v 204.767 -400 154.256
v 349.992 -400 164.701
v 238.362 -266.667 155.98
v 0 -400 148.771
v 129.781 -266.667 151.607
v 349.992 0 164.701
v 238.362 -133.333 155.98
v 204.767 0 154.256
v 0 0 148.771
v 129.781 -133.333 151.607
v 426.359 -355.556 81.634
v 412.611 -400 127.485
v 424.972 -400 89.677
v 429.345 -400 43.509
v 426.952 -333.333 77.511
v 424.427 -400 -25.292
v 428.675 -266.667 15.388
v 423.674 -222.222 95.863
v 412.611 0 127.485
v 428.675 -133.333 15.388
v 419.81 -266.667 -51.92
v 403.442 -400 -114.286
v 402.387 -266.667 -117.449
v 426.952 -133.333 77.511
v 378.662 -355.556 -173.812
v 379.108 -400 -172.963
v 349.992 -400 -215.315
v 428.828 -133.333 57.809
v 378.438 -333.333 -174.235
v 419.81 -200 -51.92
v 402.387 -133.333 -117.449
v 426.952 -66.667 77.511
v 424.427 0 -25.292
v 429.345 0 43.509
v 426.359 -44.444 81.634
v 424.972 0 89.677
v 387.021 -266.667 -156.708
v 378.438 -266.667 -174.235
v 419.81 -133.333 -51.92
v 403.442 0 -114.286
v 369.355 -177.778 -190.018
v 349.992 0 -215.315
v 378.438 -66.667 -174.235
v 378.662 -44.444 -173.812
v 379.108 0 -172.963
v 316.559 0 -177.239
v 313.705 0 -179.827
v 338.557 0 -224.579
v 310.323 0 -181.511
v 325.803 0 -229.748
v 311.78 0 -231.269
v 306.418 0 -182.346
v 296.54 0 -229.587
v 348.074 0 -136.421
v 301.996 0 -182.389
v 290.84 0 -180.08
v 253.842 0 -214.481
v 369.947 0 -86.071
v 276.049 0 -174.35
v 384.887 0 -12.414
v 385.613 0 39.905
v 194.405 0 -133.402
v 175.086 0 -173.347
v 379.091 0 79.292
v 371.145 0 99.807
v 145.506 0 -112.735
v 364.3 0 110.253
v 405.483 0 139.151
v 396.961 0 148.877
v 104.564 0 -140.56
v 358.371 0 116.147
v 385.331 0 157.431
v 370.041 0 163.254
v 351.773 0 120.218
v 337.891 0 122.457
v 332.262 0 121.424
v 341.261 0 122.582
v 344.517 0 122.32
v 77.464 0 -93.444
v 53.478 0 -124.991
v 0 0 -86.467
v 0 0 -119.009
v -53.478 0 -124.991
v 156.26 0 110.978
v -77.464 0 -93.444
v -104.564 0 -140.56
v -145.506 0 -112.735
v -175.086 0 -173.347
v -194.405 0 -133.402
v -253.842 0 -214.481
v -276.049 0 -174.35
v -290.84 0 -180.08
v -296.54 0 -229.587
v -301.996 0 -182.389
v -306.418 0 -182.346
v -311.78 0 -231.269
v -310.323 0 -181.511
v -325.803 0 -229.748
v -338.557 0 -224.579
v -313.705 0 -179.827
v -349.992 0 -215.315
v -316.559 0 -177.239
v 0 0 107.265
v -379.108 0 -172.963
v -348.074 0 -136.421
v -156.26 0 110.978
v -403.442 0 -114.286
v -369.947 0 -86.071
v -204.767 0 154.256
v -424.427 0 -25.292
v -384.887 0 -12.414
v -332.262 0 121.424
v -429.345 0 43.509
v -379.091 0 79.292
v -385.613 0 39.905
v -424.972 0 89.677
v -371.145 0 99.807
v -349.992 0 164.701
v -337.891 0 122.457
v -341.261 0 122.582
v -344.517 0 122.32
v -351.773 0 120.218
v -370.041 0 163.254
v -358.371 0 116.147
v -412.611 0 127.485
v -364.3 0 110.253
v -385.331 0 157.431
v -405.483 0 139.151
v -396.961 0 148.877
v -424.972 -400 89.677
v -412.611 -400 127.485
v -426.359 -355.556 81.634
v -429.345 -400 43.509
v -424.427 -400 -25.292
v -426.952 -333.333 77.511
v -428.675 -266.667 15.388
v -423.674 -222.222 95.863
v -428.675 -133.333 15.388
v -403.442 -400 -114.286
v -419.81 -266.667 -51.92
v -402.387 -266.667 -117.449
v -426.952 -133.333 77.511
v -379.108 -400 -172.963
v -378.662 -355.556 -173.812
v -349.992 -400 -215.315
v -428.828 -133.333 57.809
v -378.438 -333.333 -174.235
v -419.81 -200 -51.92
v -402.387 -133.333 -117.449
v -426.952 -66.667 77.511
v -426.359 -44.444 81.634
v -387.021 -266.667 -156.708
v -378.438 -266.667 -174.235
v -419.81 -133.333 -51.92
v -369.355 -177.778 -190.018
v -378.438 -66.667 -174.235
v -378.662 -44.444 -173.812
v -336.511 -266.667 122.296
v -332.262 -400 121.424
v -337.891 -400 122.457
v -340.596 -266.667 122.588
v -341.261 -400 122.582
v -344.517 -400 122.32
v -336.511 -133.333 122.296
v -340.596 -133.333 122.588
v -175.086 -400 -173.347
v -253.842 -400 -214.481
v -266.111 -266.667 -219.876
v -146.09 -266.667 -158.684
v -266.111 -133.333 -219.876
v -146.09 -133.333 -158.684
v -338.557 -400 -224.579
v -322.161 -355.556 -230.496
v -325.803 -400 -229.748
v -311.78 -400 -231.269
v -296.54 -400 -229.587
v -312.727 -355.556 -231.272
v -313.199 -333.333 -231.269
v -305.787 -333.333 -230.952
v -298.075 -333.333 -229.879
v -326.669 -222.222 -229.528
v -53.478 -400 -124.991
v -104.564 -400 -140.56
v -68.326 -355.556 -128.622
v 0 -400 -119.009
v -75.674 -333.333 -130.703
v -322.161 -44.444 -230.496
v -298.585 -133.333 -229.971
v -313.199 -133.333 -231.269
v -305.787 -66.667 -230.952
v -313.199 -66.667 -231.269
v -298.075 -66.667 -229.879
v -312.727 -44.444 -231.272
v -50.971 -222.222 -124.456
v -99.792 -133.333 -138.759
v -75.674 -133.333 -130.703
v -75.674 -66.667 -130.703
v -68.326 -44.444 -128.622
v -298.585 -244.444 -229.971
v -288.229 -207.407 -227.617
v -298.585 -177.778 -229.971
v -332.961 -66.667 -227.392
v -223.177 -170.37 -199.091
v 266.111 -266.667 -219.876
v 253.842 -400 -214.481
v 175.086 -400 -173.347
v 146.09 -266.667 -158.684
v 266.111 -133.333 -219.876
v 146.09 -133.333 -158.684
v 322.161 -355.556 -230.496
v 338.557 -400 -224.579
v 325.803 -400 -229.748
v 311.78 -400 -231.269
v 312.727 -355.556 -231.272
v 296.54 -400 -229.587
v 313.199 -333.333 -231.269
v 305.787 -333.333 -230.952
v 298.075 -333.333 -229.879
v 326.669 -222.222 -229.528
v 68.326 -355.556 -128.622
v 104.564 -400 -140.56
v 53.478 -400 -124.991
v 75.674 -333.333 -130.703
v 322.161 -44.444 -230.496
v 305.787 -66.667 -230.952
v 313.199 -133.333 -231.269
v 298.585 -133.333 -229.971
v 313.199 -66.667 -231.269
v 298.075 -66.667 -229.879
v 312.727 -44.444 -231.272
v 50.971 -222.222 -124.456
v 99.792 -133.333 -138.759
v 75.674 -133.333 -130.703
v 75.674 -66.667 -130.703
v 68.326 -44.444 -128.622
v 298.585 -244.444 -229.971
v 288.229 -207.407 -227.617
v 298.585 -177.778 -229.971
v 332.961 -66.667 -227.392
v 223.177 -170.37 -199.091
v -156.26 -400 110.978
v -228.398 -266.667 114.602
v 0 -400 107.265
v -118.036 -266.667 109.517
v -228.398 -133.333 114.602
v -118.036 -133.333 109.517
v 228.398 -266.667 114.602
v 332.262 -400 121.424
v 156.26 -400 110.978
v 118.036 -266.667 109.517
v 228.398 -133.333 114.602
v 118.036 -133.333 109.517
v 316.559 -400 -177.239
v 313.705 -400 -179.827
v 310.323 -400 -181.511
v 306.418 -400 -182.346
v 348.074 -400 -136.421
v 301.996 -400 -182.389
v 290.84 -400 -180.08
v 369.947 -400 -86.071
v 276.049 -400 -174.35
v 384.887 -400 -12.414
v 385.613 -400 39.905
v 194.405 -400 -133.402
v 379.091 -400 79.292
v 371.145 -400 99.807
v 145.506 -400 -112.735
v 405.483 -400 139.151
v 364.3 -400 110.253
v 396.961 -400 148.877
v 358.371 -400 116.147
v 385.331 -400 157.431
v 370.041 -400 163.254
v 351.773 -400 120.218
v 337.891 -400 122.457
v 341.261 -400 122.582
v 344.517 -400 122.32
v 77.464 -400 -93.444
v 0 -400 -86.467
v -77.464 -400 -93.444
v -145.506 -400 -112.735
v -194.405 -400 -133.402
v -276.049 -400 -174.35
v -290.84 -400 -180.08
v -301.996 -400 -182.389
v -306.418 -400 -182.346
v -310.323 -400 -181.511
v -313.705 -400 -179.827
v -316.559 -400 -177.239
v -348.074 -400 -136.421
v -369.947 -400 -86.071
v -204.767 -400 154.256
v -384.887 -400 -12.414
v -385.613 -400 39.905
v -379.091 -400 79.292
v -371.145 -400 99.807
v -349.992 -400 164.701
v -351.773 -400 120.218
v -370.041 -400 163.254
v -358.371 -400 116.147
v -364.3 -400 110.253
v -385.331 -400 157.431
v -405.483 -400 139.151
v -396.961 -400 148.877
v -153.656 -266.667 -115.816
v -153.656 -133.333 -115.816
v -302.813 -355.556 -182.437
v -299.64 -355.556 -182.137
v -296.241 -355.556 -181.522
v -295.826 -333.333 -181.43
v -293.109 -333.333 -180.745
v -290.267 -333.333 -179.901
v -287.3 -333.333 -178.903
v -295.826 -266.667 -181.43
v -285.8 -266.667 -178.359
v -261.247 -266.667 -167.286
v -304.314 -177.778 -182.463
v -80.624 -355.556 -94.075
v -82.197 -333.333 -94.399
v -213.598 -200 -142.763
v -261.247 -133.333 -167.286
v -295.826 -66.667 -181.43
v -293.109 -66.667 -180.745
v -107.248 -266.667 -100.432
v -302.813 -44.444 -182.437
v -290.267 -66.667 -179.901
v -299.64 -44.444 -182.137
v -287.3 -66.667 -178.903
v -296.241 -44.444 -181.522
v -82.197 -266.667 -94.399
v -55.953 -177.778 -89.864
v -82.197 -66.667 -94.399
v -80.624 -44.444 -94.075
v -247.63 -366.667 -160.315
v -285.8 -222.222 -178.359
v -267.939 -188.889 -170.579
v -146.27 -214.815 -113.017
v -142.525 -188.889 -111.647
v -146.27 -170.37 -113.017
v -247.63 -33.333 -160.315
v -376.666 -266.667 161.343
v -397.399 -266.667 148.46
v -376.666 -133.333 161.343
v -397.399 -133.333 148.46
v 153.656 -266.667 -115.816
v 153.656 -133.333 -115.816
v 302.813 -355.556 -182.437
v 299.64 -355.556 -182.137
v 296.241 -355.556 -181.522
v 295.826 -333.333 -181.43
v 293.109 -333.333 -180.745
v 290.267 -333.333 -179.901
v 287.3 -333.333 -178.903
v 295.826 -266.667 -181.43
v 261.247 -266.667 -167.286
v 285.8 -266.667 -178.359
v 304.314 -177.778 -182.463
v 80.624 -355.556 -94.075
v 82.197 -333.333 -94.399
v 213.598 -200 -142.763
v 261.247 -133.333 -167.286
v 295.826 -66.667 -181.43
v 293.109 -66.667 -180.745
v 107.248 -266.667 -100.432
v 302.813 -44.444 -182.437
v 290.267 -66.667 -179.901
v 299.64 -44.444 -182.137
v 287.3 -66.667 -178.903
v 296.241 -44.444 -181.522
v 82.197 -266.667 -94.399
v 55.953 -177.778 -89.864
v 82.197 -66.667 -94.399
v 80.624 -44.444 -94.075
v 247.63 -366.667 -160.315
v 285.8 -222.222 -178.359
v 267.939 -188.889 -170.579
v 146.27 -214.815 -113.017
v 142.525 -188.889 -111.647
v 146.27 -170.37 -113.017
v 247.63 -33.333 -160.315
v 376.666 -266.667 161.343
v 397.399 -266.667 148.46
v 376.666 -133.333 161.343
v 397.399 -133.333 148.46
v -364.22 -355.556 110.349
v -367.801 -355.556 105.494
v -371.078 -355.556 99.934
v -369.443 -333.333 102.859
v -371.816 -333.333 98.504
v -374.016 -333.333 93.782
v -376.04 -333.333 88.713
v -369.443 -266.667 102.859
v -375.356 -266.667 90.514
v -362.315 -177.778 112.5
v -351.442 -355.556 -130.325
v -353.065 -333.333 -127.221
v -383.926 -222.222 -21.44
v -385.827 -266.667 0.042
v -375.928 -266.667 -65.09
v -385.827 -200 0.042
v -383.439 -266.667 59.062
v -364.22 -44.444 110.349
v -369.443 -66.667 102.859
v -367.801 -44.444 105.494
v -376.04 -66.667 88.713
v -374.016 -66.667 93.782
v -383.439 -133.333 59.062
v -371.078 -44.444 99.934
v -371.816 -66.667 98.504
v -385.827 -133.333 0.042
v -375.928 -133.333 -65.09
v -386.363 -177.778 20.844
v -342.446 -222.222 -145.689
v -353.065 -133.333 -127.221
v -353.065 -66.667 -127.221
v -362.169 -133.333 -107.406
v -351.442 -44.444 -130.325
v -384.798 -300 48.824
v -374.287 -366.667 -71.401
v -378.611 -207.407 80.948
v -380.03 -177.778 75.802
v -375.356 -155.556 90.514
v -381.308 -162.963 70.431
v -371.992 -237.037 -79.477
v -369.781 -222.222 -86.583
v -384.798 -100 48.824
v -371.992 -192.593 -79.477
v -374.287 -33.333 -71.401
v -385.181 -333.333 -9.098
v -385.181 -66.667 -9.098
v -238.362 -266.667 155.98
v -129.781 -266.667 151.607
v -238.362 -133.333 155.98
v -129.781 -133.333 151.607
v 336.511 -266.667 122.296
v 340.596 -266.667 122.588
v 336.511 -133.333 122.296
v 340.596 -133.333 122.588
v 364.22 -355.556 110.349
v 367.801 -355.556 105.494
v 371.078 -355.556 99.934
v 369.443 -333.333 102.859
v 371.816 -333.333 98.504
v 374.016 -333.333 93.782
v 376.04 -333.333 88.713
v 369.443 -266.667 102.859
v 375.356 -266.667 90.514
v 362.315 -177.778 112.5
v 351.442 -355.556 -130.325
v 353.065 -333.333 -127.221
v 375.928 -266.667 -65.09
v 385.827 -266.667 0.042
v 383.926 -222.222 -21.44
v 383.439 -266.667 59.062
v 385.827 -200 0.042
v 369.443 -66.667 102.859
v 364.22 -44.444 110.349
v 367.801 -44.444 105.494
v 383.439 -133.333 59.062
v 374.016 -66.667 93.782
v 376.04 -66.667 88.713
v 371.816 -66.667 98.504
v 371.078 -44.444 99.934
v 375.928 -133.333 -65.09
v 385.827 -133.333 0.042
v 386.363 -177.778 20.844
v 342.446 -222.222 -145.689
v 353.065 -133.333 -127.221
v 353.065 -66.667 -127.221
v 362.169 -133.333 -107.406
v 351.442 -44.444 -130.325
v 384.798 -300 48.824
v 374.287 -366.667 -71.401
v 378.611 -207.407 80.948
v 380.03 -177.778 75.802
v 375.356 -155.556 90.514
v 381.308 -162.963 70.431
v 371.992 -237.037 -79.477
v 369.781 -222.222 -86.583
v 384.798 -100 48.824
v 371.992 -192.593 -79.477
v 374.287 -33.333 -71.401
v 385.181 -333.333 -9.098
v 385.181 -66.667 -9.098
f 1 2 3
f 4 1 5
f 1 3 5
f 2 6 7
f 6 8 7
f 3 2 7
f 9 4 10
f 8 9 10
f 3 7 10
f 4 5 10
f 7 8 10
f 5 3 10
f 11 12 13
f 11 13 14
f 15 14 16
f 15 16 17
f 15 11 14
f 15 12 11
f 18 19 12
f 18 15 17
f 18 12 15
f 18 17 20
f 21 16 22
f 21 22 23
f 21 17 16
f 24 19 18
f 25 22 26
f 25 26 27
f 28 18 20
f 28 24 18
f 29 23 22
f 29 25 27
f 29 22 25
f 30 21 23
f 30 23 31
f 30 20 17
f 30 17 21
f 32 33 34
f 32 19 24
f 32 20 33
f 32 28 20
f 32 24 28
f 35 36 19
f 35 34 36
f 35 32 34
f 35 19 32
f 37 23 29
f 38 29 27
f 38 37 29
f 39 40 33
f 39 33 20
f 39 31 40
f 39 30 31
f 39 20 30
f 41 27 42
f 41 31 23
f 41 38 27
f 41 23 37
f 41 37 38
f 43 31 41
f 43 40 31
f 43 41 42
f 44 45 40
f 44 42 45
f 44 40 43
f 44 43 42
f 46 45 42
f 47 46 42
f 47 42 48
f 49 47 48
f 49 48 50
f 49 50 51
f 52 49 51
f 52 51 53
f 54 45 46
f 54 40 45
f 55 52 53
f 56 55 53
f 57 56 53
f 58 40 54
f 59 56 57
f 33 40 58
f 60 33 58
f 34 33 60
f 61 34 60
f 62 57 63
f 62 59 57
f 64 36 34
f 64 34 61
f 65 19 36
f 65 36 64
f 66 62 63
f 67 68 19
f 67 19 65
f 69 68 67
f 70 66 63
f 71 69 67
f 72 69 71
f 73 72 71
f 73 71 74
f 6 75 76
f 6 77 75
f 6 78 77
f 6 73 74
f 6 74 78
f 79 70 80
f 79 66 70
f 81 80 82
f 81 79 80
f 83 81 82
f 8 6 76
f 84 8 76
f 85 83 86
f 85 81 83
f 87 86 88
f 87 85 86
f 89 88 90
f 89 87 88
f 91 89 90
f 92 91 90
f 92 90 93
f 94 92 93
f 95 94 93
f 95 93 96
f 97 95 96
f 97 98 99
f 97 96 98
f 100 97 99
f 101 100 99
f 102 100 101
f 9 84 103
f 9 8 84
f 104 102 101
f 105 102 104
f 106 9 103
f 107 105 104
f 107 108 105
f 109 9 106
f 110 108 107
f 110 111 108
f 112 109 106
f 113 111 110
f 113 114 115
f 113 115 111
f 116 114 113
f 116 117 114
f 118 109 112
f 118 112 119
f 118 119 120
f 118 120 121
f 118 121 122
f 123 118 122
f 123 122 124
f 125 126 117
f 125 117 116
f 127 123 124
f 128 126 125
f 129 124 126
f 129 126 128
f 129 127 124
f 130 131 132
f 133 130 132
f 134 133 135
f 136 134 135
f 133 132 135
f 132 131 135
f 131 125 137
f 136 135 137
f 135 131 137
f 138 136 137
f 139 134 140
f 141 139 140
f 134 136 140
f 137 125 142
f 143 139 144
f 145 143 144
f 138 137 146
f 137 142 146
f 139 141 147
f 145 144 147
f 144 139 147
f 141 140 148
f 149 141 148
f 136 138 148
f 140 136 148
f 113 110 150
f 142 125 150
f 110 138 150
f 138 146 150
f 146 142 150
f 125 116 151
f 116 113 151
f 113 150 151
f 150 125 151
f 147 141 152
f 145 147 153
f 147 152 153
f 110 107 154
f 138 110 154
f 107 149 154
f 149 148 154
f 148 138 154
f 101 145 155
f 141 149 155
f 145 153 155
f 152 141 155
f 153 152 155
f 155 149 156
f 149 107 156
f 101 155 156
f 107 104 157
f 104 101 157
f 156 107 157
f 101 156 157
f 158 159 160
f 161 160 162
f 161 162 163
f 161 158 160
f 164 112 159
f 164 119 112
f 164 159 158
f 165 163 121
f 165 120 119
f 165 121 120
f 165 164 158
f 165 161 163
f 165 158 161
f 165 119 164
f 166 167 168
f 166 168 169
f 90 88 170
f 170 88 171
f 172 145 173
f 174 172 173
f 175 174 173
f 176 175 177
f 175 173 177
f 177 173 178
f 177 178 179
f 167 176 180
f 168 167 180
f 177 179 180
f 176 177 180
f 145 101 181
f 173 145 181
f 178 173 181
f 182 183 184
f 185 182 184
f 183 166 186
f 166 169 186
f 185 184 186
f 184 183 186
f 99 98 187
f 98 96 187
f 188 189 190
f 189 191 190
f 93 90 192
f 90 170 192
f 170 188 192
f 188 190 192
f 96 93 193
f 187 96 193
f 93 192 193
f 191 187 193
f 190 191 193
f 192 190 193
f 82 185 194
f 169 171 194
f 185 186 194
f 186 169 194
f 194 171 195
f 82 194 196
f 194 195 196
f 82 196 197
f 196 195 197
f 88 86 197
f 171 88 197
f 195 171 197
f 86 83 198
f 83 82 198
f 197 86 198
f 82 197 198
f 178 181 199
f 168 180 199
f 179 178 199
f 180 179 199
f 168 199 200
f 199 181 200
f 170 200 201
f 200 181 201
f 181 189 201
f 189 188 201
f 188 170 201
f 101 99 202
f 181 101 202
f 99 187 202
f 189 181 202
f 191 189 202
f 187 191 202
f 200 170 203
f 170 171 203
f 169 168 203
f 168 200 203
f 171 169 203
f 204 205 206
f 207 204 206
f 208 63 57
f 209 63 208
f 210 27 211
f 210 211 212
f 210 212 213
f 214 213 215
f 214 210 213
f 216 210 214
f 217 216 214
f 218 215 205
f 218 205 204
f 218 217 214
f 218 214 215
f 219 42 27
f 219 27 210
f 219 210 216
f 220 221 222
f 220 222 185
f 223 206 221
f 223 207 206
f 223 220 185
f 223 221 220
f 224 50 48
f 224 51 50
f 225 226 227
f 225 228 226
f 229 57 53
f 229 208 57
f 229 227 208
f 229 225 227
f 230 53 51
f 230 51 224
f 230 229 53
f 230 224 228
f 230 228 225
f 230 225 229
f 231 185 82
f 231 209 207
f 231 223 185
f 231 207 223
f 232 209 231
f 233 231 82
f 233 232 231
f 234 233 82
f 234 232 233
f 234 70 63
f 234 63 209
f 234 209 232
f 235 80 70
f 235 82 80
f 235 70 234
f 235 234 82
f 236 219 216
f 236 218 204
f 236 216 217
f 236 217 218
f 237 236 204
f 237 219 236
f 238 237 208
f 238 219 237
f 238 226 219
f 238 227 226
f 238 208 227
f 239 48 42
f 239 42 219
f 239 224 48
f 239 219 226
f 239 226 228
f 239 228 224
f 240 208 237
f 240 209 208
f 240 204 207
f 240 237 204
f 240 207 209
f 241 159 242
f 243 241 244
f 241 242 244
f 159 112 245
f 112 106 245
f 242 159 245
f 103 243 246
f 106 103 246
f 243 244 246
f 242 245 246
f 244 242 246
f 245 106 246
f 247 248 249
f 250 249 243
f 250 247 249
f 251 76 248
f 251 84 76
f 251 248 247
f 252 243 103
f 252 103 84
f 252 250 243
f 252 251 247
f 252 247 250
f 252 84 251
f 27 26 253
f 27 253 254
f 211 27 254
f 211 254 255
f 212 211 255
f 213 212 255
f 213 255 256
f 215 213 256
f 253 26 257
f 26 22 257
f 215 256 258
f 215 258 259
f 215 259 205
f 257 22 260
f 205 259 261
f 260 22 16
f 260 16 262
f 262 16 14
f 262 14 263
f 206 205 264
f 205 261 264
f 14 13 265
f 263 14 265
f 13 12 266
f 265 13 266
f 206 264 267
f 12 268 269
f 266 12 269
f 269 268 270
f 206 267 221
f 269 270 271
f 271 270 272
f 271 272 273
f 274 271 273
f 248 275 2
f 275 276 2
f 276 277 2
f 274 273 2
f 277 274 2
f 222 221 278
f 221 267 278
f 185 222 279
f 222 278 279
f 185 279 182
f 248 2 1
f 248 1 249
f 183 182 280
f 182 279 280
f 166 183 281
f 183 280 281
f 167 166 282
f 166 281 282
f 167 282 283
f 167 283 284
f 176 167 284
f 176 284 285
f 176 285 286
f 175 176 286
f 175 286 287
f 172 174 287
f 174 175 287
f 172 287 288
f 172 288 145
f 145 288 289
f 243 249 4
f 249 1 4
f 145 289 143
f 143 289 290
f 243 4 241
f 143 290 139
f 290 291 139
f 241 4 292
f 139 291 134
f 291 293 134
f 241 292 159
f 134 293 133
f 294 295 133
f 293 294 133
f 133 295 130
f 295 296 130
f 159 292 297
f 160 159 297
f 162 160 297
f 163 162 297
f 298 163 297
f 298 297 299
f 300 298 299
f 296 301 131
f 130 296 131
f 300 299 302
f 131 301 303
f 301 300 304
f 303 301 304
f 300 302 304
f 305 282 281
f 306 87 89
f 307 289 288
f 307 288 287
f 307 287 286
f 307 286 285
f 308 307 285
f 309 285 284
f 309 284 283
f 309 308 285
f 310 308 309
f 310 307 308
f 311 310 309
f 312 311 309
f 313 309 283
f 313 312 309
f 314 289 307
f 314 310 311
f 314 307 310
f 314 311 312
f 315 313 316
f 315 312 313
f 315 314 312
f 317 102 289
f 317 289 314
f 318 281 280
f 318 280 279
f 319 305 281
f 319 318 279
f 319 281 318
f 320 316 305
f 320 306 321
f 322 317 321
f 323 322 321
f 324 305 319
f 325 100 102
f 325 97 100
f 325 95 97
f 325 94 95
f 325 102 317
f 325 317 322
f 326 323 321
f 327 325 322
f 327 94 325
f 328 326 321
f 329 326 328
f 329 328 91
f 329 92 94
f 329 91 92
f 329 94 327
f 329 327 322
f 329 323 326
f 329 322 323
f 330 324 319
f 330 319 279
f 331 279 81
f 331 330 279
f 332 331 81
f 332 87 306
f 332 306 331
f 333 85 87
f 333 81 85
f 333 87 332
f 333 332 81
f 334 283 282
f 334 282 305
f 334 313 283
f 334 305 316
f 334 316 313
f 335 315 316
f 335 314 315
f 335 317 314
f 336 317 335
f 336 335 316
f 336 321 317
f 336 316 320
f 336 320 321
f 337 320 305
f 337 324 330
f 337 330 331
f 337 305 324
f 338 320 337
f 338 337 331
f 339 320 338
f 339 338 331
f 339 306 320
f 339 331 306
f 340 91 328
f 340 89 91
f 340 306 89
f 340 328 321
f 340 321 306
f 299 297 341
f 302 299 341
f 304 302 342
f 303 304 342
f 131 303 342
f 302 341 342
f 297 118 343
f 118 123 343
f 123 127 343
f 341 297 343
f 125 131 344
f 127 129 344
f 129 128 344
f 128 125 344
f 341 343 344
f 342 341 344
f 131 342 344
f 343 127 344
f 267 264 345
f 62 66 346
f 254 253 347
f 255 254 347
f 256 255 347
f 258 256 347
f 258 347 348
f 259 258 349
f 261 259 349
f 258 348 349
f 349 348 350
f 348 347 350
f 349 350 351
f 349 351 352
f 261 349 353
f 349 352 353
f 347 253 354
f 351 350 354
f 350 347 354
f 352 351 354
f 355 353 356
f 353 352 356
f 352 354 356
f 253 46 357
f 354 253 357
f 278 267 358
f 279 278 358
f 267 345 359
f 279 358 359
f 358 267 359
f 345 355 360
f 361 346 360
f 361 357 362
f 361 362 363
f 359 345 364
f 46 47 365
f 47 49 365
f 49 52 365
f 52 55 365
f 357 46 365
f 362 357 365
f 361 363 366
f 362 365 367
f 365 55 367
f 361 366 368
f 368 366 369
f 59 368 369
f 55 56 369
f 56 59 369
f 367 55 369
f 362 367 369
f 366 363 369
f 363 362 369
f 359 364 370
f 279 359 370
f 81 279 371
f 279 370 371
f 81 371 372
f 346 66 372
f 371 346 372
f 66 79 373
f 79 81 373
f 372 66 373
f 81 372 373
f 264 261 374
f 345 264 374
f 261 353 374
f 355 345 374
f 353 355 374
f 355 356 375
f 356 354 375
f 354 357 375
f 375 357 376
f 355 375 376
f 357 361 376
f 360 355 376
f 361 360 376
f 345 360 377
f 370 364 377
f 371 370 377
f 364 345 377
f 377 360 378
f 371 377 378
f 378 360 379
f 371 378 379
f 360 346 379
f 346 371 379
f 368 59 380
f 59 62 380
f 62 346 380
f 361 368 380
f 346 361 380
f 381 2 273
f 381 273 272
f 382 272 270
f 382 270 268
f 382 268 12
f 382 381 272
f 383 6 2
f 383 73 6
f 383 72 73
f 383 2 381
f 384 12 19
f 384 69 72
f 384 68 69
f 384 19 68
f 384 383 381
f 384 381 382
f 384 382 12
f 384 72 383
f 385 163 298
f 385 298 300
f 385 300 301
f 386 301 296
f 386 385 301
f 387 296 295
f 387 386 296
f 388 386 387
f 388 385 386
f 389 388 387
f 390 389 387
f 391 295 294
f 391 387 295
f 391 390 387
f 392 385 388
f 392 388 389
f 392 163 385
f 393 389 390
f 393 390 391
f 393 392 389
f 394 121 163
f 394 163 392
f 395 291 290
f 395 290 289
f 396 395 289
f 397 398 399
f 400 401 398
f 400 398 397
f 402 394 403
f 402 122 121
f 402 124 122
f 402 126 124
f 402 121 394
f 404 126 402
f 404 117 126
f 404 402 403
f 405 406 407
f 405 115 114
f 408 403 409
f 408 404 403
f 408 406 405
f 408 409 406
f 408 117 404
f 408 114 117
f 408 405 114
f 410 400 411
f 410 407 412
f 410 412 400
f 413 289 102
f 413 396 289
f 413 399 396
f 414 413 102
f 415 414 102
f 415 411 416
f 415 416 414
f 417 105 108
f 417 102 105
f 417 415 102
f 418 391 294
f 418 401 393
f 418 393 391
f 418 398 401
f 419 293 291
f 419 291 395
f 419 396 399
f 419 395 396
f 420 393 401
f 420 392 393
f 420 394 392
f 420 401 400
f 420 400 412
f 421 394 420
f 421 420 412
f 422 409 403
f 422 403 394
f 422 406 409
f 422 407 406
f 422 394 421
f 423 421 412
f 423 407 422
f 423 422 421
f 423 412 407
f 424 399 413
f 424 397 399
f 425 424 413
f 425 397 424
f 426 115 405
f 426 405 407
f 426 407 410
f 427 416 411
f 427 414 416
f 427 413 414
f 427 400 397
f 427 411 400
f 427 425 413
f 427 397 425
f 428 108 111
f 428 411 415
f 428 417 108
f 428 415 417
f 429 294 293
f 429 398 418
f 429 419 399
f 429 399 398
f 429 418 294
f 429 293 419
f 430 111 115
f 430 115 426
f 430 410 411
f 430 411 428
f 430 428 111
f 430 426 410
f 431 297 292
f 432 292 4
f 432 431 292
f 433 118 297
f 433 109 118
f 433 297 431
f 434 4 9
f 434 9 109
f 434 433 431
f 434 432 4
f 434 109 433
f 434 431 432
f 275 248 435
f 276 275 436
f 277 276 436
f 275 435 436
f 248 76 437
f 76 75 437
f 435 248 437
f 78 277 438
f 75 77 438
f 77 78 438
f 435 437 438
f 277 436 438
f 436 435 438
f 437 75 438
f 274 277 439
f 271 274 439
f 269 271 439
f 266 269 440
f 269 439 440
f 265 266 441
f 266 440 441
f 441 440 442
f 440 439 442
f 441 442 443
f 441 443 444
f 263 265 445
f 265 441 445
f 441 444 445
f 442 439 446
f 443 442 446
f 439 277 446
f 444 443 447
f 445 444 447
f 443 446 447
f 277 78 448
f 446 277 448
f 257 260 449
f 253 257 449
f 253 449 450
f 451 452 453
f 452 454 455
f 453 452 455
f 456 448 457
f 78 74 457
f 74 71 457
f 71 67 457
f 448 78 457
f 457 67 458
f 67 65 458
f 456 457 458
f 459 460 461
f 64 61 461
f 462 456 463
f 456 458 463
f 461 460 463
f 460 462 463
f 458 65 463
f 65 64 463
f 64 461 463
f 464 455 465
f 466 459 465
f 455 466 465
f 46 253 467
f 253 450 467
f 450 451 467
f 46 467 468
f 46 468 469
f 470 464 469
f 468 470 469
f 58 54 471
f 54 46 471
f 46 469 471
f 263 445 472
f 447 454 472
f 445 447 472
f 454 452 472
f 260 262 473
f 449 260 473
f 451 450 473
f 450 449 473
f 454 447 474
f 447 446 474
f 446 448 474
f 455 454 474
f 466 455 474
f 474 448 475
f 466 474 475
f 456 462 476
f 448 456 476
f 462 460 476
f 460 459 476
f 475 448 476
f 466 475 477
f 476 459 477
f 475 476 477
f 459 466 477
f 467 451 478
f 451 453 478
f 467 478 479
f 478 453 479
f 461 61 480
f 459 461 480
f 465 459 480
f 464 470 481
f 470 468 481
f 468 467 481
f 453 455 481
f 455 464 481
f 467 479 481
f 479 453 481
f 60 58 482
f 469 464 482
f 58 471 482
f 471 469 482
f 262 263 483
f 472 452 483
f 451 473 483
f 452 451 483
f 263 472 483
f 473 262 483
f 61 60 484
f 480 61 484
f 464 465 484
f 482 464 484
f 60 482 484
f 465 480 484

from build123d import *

# Parameters (mm, degrees)
F1_DEPTH = 400


with BuildPart() as f1:
    # F0 (on Front) → F1 (new body)
    with BuildSketch(Plane.XZ):
        with BuildLine():
            add(Edge.make_bspline(
                [(-349.9918261405, 164.7005370527), (-228.7541310859, 152.8680934101), (-148.4648335347, 151.7757154689), (0, 148.7712413073)],
                knots=[17.2755734709, 17.2755734709, 17.2755734709, 17.2755734709, 368.6136798781, 368.6136798781, 368.6136798781, 368.6136798781], degree=3))
            add(Edge.make_bspline(
                [(-349.9918261405, 164.7005370527), (-379.7747257767, 166.5833651071), (-400.0212253579, 152.0293008743), (-412.6107976831, 127.4847845064)],
                knots=[0, 0, 0, 0, 86.6035481416, 86.6035481416, 86.6035481416, 86.6035481416], degree=3))
            add(Edge.make_bspline(
                [(-412.6107976774, 127.4847845008), (-390.2805647898, 125.7630890537), (-367.6040024639, 124.021633923), (-344.5166107631, 122.3204635533)],
                knots=[55.3884070152, 55.3884070152, 55.3884070152, 55.3884070152, 129.1746995747, 129.1746995747, 129.1746995747, 129.1746995747], degree=3))
            add(Edge.make_bspline(
                [(-332.2621001683, 121.4244425258), (-336.5916827882, 122.5915718518), (-340.6786149646, 122.8620951072), (-344.5166107631, 122.3204635533)],
                knots=[0, 0, 0, 0, 17.888080119, 17.888080119, 17.888080119, 17.888080119], degree=3))
            add(Edge.make_bspline(
                [(-332.2621001683, 121.4244425258), (-231.2540764526, 114.0987320503), (-122.2665528935, 107.7345344123), (0, 107.2653010488)],
                knots=[142.1884395148, 142.1884395148, 142.1884395148, 142.1884395148, 462.9643141605, 462.9643141605, 462.9643141605, 462.9643141605], degree=3))
            add(Edge.make_bspline(
                [(332.2621001683, 121.4244425258), (231.2540764526, 114.0987320503), (122.2665528935, 107.7345344123), (0, 107.2653010488)],
                knots=[142.1884395148, 142.1884395148, 142.1884395148, 142.1884395148, 462.9643141605, 462.9643141605, 462.9643141605, 462.9643141605], degree=3))
            add(Edge.make_bspline(
                [(332.2621001683, 121.4244425258), (336.5916827882, 122.5915718518), (340.6786149646, 122.8620951072), (344.5166107631, 122.3204635533)],
                knots=[0, 0, 0, 0, 17.888080119, 17.888080119, 17.888080119, 17.888080119], degree=3))
            add(Edge.make_bspline(
                [(412.6107976774, 127.4847845008), (390.2805647898, 125.7630890537), (367.6040024639, 124.021633923), (344.5166107631, 122.3204635533)],
                knots=[55.3884070152, 55.3884070152, 55.3884070152, 55.3884070152, 129.1746995747, 129.1746995747, 129.1746995747, 129.1746995747], degree=3))
            add(Edge.make_bspline(
                [(349.9918261405, 164.7005370527), (379.7747257767, 166.5833651071), (400.0212253579, 152.0293008743), (412.6107976831, 127.4847845064)],
                knots=[0, 0, 0, 0, 86.6035481416, 86.6035481416, 86.6035481416, 86.6035481416], degree=3))
            add(Edge.make_bspline(
                [(349.9918261405, 164.7005370527), (228.7541310859, 152.8680934101), (148.4648335347, 151.7757154689), (0, 148.7712413073)],
                knots=[17.2755734709, 17.2755734709, 17.2755734709, 17.2755734709, 368.6136798781, 368.6136798781, 368.6136798781, 368.6136798781], degree=3))
        make_face()
        with BuildLine():
            add(Edge.make_bspline(
                [(-412.6107976774, 127.4847845008), (-390.2805647898, 125.7630890537), (-367.6040024639, 124.021633923), (-344.5166107631, 122.3204635533)],
                knots=[55.3884070152, 55.3884070152, 55.3884070152, 55.3884070152, 129.1746995747, 129.1746995747, 129.1746995747, 129.1746995747], degree=3))
            add(Edge.make_bspline(
                [(-412.6107976831, 127.4847845064), (-455.2641858876, 44.3281245427), (-410.0275390456, -153.5039344324), (-349.9918261405, -215.3152623841)],
                knots=[86.6035481416, 86.6035481416, 86.6035481416, 86.6035481416, 380.0157994368, 380.0157994368, 380.0157994368, 380.0157994368], degree=3))
            add(Edge.make_bspline(
                [(-349.9918261405, -215.3152623841), (-287.5397462749, -281.8407177446), (-155.7662200923, -118.8372276745), (0, -119.0087459604)],
                knots=[0, 0, 0, 0, 363.0003078109, 363.0003078109, 363.0003078109, 363.0003078109], degree=3))
            add(Edge.make_bspline(
                [(349.9918261405, -215.3152623841), (287.5397462749, -281.8407177446), (155.7662200923, -118.8372276745), (0, -119.0087459604)],
                knots=[0, 0, 0, 0, 363.0003078109, 363.0003078109, 363.0003078109, 363.0003078109], degree=3))
            add(Edge.make_bspline(
                [(412.6107976831, 127.4847845064), (455.2641858876, 44.3281245427), (410.0275390456, -153.5039344324), (349.9918261405, -215.3152623841)],
                knots=[86.6035481416, 86.6035481416, 86.6035481416, 86.6035481416, 380.0157994368, 380.0157994368, 380.0157994368, 380.0157994368], degree=3))
            add(Edge.make_bspline(
                [(412.6107976774, 127.4847845008), (390.2805647898, 125.7630890537), (367.6040024639, 124.021633923), (344.5166107631, 122.3204635533)],
                knots=[55.3884070152, 55.3884070152, 55.3884070152, 55.3884070152, 129.1746995747, 129.1746995747, 129.1746995747, 129.1746995747], degree=3))
            add(Edge.make_bspline(
                [(344.5166107631, 122.3204635533), (404.847274862, 113.8063866609), (403.6665423185, -95.3885912359), (316.5586292744, -177.2394478321)],
                knots=[17.888080119, 17.888080119, 17.888080119, 17.888080119, 299.0764424053, 299.0764424053, 299.0764424053, 299.0764424053], degree=3))
            add(Edge.make_bspline(
                [(316.5586292744, -177.2394478321), (289.4581258297, -209.2567682266), (174.6161052003, -83.5422830285), (0, -86.466948735)],
                knots=[0, 0, 0, 0, 329.3159764731, 329.3159764731, 329.3159764731, 329.3159764731], degree=3))
            add(Edge.make_bspline(
                [(-316.5586292744, -177.2394478321), (-289.4581258297, -209.2567682266), (-174.6161052003, -83.5422830285), (0, -86.466948735)],
                knots=[0, 0, 0, 0, 329.3159764731, 329.3159764731, 329.3159764731, 329.3159764731], degree=3))
            add(Edge.make_bspline(
                [(-344.5166107631, 122.3204635533), (-404.847274862, 113.8063866609), (-403.6665423185, -95.3885912359), (-316.5586292744, -177.2394478321)],
                knots=[17.888080119, 17.888080119, 17.888080119, 17.888080119, 299.0764424053, 299.0764424053, 299.0764424053, 299.0764424053], degree=3))
        make_face()
    extrude(amount=F1_DEPTH)


solid = f1.part
